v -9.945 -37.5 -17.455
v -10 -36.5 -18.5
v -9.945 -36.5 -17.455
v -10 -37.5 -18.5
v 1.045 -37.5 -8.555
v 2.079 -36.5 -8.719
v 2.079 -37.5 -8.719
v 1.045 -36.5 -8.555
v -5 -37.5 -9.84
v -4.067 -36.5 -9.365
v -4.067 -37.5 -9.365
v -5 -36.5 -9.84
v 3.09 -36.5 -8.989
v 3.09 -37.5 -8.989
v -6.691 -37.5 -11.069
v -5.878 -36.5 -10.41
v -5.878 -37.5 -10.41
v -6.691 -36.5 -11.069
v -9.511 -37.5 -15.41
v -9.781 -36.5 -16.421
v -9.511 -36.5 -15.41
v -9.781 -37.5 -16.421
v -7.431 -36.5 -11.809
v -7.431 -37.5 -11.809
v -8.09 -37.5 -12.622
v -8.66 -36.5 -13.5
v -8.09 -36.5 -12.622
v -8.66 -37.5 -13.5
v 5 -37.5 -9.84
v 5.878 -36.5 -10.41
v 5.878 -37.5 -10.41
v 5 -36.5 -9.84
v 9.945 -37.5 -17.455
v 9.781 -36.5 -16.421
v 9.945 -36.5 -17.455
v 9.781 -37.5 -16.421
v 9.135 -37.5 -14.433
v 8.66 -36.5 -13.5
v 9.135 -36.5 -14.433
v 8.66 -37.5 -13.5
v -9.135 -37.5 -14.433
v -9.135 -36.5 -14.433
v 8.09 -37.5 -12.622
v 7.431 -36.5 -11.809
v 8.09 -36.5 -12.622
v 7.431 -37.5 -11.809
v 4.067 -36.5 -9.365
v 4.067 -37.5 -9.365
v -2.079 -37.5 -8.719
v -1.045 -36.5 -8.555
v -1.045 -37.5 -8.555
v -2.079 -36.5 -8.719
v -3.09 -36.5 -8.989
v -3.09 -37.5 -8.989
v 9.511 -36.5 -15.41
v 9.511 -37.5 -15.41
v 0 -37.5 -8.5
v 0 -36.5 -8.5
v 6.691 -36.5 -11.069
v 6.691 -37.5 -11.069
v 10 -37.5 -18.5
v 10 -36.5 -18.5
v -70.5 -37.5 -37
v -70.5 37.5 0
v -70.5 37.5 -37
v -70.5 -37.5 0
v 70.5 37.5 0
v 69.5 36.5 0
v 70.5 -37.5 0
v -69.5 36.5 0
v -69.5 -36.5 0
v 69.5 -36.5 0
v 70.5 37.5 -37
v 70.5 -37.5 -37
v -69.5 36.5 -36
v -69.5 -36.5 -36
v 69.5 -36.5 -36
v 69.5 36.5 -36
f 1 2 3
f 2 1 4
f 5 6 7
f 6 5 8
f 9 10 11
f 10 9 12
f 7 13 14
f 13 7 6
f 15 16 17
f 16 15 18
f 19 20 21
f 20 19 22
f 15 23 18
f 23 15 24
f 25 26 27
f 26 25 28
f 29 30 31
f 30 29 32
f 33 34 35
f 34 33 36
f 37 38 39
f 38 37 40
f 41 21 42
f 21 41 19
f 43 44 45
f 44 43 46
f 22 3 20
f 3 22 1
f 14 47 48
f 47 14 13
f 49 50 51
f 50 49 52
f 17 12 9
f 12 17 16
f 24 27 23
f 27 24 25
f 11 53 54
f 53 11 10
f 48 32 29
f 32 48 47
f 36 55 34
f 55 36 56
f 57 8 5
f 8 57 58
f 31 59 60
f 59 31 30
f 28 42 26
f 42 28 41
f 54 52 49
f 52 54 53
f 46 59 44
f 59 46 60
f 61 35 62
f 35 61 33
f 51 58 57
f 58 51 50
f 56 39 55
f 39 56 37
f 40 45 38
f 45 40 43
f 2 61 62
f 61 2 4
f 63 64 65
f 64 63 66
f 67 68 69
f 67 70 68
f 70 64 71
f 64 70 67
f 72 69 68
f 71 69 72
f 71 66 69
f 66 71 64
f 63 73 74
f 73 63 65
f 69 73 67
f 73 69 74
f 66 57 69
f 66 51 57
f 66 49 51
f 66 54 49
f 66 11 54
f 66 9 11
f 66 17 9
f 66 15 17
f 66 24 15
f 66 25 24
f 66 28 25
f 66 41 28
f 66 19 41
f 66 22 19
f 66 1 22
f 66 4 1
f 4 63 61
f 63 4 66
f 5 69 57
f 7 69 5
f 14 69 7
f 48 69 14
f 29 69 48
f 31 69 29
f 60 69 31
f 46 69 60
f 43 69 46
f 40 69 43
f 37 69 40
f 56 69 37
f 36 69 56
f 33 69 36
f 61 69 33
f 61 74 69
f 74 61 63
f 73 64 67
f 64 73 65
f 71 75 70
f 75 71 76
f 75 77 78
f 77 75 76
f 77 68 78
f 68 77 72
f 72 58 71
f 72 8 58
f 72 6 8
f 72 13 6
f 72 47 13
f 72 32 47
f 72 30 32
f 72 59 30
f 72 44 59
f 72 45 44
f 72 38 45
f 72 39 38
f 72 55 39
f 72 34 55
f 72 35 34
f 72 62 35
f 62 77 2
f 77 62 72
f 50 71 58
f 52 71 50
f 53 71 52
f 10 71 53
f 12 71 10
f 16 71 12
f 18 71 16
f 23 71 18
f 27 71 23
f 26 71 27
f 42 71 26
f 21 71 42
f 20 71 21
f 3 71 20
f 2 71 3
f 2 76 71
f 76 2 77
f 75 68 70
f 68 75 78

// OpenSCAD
/***********************************************************************
Name ......... : pcBayDrawer.scad
Description....: 5.25" PC Bay Drawer
Author ....... : Garrett Melenka
Version ...... : V1.0 2016/07/10
Licence ...... : GPL
***********************************************************************/
//Part Display Options 
part = 1;//[0:All, 1:drawer, 2: Pc mount]

//Dimensions measured from Antec 300 PC Case
//width of drawer mount bracket
x=146;
//length of drawer mount bracket[50:5:150]
y=80;
//height of drawer mount bracket
z=42;  

//thickness of drawer mount walls
mountWallThickness = 4; 
//Add tolerance to bin dimensions so it slides easily into the mount
drawerTolerance = 1;

//Dimensions of Drawer
//Width of drawer
width = x-mountWallThickness-drawerTolerance;
//Height of Drawer
height = z-mountWallThickness-drawerTolerance;
//Length of Drawer
length = y-mountWallThickness-drawerTolerance;
//specify thickness of drawer walls
wallThickness = 2; 

//mounting screws to connect the drawer mount to ATX case
//diameter of mounting screw
mountScrewDiameter = 2.75; 
//depth of mounting screw
mountScrewLength = 5; 
//number of screws to add to the drawer mount bracket
mountHoles = 2; 

//Tab Option
tabOption = 3; //[0:tab, 1:handle, 2:knob, 3: half circle hole, 4: No Tab / Handle]
//Thickness of Tab/ handle
tabThickness = 5;
//Radius of Tab / handle
tabRadius = 30;
//Depth of tab/ handle
tabDepth = 10;
// knob diameter if tabOption == 2
knobDiameter = 20; 
// hole diameter if tabOption == 3
holeDiameter = 20;
// Drawer Face Option 
drawerFaceOption = 0; //[0:No pattern on drawer face, 1:pattern on drawer face]
//spacing for front face pattern
frontSpacing = 5;
//diameter of front face pattern
frontDesignDiameter = 2;
//depth of front face pattern
frontDesignDepth = 2;



//Drawer for PC Case
module pcBayDrawer()
{
    union()
    {
    difference()
    {
    translate([0,0,-height*0.5]){
    cube(size = [width, length, height], center = true);
    }
    
    translate([0,0,-(height-wallThickness)*0.5]){
    cube(size = [width-wallThickness, length-wallThickness, height], center = true);
    }
    
    if(drawerFaceOption ==1)
    {
    for (j = [-height:frontSpacing:height]){
    for (i = [-width:frontSpacing:width])
    {
    
    translate([i,length*0.5+0.5, -2+j])
    {
    rotate([90,0,0])
    {
    cylinder(h = frontDesignDepth, r = frontDesignDiameter*0.5, center = true);
    }
    }
    }
    }
    }
    // hole option
    if (tabOption ==3)
    {
        translate([0,length*0.5, -height*0.5])
        {
        rotate([90, 90, 0])
        {
        
        difference(){
        cylinder(h = wallThickness*2, r = holeDiameter*0.5, center = true);
        
        translate([holeDiameter*0.5, 0, 0]){
        cube(size = [holeDiameter, holeDiameter, wallThickness*2], center = true);
        }
        
        }
        }
        }
        }
    }
    
    
    
    // Drawer Tab Option
    if (tabOption ==0){
    translate([0, length*0.5+tabDepth*0.5, -height*0.5])
    {
    union()
    {    
    cube(size = [tabDepth*2,tabDepth,tabThickness], center = true);
    
    translate([0,tabDepth*0.5,0]){  
    cylinder(h=tabThickness, r=tabDepth, center = true);
    }
    }
    }
    }
    
    //Drawer Handle Option
    if (tabOption == 1)
    {
       
       translate([0,length*0.5,-height*0.5])
       { 
        
       difference(){
       cylinder(h = tabDepth, r = tabRadius, center = true);
           
       cylinder(h = tabDepth, r = tabRadius-tabThickness, center = true);
       
        
       translate([0,-tabRadius*0.5,0])
       {
       cube(size = [tabRadius*2, tabRadius, tabDepth], center = true); 
       }
        }
    }
        
    }
    
    
    //Drawer Knob Option
    if (tabOption ==2)
    {
        
        
        translate([0,length*0.5+tabDepth*0.5,-height*0.5])
        {
        rotate([-90,0,0])
        {
        hull(){
        cylinder(h = tabDepth, r=knobDiameter*0.5, center = true);
        
        translate([0,0,tabDepth]){
        cylinder(h = tabDepth, r=knobDiameter*0.5+5, center = true);
        }
        }
        }
        }
        
        
        }
    
    
    }
    
    
}
//Mount for PC Case
module pcBayMount()
{
    difference()
    {
    cube(size = [x, y, z], center = true);
    translate([0,(y-length)*0.5,0]){
    cube(size = [x-mountWallThickness, y-mountWallThickness, z-mountWallThickness], center = true);
    }
    
    
    
    mountHoleSpacing = (y-20) / mountHoles;
    echo(mountHoleSpacing);
    
    //for(i = [(-y*0.5 + 10):mountHoleSpacing:(y*0.5-10)])
    for(i = [-mountHoles:1:mountHoles])    
    {
    
    translate([x*0.5-mountScrewLength*0.5, i*mountHoleSpacing, -height*0.25]){
    rotate([0,90,0]){
    cylinder(h=mountScrewLength, r = mountScrewDiameter*0.5, center = true);
    }
    }
    
    translate([x*0.5-mountScrewLength*0.5, i*mountHoleSpacing, height*0.25]){
    rotate([0,90,0]){
    cylinder(h=mountScrewLength, r = mountScrewDiameter*0.5, center = true);
    }
    }
    
    
    translate([-x*0.5+mountScrewLength*0.5, i*mountHoleSpacing, -height*0.25]){
    rotate([0,90,0]){
    cylinder(h=mountScrewLength, r = mountScrewDiameter*0.5, center = true);
    }
    }
    
    translate([-x*0.5+mountScrewLength*0.5, i*mountHoleSpacing, height*0.25]){
    rotate([0,90,0]){
    cylinder(h=mountScrewLength, r = mountScrewDiameter*0.5, center = true);
    }
    }
    
    }
    }
    
    
    
}


// Display Drawer and Mount
if (part == 0){

$fn = 60;
color("green")
translate([0,0,height*0.5]){
pcBayDrawer();
}



%pcBayMount();
}

// Display Drawer
if (part == 1)
{
    $fn = 60;
color("green")
//translate([0,20,height*0.5])
rotate([0,0,180])   
    {
pcBayDrawer();
}
}
// Display Mount
if (part == 2)
{
  $fn = 60;
  pcBayMount();  
}
